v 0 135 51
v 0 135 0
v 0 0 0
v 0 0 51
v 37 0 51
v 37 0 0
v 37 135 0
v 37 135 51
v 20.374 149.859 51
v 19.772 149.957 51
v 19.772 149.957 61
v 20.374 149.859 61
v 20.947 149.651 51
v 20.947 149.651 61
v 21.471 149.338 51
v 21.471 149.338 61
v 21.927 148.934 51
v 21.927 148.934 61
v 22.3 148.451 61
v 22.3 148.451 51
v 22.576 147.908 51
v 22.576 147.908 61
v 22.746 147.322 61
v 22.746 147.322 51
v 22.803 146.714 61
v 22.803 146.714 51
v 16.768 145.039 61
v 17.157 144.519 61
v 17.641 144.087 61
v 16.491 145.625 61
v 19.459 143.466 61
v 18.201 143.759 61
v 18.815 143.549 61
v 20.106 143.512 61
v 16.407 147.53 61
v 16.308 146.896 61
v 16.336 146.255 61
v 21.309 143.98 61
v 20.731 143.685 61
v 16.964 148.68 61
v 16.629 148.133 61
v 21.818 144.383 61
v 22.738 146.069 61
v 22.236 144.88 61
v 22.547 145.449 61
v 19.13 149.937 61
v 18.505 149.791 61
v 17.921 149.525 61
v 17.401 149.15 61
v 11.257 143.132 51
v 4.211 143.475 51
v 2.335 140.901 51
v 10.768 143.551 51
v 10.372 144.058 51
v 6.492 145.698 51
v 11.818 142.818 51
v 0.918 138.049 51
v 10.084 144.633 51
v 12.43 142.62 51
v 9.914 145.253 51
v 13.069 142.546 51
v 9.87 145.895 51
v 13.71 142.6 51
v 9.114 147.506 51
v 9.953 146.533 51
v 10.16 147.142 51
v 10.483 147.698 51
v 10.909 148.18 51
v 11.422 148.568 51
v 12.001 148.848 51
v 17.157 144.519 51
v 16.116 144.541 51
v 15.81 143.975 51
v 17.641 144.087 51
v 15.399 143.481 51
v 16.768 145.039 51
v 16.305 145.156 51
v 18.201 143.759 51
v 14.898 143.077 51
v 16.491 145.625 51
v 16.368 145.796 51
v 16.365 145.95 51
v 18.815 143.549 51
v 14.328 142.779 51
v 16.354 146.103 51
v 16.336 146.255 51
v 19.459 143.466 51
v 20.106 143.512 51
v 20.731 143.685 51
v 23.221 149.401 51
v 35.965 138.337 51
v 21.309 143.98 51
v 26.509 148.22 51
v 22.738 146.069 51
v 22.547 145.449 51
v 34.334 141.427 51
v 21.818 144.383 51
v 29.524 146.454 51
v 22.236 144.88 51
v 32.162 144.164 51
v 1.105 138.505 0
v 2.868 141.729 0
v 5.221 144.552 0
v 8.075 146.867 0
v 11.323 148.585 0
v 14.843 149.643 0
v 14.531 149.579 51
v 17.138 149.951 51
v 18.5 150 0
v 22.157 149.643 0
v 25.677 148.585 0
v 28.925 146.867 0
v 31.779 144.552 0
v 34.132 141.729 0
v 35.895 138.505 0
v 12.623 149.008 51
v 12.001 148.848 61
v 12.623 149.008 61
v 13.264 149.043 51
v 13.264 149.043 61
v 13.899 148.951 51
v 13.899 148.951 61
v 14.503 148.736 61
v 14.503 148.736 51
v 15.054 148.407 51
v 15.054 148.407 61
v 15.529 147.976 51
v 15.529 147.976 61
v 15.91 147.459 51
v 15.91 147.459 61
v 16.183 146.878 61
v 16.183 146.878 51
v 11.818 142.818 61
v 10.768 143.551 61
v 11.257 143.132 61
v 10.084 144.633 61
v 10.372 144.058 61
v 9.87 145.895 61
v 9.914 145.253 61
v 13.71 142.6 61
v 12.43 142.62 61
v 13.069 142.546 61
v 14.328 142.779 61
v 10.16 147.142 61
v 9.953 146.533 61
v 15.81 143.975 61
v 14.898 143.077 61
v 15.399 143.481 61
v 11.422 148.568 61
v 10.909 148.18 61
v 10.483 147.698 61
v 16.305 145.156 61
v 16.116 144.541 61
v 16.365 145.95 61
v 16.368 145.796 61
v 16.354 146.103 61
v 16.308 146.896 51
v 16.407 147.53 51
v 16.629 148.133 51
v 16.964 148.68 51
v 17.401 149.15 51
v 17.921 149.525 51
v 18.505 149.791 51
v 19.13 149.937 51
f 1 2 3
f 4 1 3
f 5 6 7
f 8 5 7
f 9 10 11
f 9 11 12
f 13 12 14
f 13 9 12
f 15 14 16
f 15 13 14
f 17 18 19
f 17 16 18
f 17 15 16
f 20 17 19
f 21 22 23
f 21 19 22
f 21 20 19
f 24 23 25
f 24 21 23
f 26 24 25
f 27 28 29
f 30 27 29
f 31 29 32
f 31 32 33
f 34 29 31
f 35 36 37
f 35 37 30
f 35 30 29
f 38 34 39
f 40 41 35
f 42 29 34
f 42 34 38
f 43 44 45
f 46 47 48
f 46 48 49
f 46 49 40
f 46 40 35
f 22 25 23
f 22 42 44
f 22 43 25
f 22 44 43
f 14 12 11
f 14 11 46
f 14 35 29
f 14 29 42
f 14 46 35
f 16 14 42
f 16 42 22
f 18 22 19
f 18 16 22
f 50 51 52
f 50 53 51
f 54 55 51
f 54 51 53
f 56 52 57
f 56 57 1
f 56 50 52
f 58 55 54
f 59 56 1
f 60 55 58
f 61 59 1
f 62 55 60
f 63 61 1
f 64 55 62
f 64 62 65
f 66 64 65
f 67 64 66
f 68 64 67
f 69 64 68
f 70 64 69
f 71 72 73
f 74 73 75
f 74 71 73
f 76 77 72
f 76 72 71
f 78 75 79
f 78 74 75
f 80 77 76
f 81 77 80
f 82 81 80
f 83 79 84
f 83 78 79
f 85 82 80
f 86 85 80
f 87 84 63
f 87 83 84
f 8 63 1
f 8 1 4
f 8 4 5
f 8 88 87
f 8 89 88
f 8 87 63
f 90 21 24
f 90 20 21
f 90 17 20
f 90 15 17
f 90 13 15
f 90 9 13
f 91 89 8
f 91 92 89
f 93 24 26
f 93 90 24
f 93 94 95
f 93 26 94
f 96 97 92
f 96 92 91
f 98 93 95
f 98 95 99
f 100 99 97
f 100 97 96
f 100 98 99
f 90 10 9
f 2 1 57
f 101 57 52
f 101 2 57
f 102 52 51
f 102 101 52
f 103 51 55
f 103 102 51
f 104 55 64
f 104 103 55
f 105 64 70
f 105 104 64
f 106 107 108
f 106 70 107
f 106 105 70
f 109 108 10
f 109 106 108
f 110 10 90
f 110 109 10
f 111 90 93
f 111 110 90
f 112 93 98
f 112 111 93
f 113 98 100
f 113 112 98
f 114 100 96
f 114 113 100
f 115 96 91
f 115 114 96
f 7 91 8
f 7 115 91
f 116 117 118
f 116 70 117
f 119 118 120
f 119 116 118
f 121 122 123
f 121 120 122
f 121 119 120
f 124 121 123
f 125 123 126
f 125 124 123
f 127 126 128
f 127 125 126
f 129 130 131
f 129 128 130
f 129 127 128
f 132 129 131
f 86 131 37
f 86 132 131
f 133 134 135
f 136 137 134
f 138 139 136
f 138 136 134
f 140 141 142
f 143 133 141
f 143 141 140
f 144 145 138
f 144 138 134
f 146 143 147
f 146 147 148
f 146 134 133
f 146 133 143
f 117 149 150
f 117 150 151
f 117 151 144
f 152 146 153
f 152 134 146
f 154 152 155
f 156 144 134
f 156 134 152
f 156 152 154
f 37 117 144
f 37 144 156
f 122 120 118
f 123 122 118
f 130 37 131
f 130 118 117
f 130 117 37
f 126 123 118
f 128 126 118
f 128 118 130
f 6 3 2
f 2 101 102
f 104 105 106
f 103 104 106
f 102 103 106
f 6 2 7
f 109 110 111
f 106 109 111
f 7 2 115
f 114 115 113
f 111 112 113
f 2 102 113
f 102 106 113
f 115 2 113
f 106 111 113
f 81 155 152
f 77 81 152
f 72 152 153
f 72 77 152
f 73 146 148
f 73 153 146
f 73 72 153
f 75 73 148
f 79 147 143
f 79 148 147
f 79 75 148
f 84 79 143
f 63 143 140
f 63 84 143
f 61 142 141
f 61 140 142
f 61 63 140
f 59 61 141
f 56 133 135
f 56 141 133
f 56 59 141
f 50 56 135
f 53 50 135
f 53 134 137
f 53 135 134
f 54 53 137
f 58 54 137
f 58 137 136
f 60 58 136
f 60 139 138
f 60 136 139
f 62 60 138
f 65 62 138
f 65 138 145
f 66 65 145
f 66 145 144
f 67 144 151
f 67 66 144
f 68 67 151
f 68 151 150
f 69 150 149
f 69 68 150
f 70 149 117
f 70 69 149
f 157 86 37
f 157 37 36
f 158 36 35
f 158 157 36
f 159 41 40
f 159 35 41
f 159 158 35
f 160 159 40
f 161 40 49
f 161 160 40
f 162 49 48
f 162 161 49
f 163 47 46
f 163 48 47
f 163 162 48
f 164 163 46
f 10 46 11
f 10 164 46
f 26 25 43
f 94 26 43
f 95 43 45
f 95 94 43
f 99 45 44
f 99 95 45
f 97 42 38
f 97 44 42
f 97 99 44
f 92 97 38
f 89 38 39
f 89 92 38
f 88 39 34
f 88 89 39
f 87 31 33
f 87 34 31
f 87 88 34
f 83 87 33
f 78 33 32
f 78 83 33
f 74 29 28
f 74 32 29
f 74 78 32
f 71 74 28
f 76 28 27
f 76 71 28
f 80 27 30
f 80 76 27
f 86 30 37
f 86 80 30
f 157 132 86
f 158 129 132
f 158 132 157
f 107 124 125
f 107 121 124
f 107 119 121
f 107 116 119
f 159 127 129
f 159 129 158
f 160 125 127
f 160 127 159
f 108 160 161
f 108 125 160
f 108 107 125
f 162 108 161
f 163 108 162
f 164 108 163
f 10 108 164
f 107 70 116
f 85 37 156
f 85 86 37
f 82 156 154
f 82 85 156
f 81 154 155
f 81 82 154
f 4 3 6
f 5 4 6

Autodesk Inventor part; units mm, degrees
ref_plane "YZ Plane" through (0, 0, 0) normal (1, 0, 0) x (0, 1, 0)
ref_plane "XZ Plane" through (0, 0, 0) normal (0, 1, 0) x (-1, 0, 0)
ref_plane "XY Plane" through (0, 0, 0) normal (0, 0, 1) x (1, 0, 0)
sketch "スケッチ1" plane through (0, 0, 0) normal (0, 0, 1) x (1, 0, 0)
  line L0 (0, 0) -> (37, 0)
  line L1 (37, 0) -> (37, 135)
  line L2 (0, 135) -> (0, 0)
  arc A0 (37, 135) -> (0, 135) centre (18.5, 131.0917) ccw
  point P0 (18.5, 150)
  dimension "d0" = 37
  dimension "d1" = 135
extrude "押し出し1" add sketch "スケッチ1" along normal blind 51
sketch "スケッチ2" plane through (0, 0, 51) normal (0, 0, 1) x (1, 0, 0)
  circle A0 centre (13.1184, 145.7961) radius 3.25
  circle A1 centre (19.5531, 146.7145) radius 3.25
  arc A2 (37, 135) -> (0, 135) centre (18.5, 131.0917) ccw projected
  point P0 (0, 0)
  dimension "d5" = 6.5
  dimension "d6" = 6.5
extrude "押し出し2" add sketch "スケッチ2" along normal blind 10 contours A0 | A1
properties part number "turnigy_sa"
